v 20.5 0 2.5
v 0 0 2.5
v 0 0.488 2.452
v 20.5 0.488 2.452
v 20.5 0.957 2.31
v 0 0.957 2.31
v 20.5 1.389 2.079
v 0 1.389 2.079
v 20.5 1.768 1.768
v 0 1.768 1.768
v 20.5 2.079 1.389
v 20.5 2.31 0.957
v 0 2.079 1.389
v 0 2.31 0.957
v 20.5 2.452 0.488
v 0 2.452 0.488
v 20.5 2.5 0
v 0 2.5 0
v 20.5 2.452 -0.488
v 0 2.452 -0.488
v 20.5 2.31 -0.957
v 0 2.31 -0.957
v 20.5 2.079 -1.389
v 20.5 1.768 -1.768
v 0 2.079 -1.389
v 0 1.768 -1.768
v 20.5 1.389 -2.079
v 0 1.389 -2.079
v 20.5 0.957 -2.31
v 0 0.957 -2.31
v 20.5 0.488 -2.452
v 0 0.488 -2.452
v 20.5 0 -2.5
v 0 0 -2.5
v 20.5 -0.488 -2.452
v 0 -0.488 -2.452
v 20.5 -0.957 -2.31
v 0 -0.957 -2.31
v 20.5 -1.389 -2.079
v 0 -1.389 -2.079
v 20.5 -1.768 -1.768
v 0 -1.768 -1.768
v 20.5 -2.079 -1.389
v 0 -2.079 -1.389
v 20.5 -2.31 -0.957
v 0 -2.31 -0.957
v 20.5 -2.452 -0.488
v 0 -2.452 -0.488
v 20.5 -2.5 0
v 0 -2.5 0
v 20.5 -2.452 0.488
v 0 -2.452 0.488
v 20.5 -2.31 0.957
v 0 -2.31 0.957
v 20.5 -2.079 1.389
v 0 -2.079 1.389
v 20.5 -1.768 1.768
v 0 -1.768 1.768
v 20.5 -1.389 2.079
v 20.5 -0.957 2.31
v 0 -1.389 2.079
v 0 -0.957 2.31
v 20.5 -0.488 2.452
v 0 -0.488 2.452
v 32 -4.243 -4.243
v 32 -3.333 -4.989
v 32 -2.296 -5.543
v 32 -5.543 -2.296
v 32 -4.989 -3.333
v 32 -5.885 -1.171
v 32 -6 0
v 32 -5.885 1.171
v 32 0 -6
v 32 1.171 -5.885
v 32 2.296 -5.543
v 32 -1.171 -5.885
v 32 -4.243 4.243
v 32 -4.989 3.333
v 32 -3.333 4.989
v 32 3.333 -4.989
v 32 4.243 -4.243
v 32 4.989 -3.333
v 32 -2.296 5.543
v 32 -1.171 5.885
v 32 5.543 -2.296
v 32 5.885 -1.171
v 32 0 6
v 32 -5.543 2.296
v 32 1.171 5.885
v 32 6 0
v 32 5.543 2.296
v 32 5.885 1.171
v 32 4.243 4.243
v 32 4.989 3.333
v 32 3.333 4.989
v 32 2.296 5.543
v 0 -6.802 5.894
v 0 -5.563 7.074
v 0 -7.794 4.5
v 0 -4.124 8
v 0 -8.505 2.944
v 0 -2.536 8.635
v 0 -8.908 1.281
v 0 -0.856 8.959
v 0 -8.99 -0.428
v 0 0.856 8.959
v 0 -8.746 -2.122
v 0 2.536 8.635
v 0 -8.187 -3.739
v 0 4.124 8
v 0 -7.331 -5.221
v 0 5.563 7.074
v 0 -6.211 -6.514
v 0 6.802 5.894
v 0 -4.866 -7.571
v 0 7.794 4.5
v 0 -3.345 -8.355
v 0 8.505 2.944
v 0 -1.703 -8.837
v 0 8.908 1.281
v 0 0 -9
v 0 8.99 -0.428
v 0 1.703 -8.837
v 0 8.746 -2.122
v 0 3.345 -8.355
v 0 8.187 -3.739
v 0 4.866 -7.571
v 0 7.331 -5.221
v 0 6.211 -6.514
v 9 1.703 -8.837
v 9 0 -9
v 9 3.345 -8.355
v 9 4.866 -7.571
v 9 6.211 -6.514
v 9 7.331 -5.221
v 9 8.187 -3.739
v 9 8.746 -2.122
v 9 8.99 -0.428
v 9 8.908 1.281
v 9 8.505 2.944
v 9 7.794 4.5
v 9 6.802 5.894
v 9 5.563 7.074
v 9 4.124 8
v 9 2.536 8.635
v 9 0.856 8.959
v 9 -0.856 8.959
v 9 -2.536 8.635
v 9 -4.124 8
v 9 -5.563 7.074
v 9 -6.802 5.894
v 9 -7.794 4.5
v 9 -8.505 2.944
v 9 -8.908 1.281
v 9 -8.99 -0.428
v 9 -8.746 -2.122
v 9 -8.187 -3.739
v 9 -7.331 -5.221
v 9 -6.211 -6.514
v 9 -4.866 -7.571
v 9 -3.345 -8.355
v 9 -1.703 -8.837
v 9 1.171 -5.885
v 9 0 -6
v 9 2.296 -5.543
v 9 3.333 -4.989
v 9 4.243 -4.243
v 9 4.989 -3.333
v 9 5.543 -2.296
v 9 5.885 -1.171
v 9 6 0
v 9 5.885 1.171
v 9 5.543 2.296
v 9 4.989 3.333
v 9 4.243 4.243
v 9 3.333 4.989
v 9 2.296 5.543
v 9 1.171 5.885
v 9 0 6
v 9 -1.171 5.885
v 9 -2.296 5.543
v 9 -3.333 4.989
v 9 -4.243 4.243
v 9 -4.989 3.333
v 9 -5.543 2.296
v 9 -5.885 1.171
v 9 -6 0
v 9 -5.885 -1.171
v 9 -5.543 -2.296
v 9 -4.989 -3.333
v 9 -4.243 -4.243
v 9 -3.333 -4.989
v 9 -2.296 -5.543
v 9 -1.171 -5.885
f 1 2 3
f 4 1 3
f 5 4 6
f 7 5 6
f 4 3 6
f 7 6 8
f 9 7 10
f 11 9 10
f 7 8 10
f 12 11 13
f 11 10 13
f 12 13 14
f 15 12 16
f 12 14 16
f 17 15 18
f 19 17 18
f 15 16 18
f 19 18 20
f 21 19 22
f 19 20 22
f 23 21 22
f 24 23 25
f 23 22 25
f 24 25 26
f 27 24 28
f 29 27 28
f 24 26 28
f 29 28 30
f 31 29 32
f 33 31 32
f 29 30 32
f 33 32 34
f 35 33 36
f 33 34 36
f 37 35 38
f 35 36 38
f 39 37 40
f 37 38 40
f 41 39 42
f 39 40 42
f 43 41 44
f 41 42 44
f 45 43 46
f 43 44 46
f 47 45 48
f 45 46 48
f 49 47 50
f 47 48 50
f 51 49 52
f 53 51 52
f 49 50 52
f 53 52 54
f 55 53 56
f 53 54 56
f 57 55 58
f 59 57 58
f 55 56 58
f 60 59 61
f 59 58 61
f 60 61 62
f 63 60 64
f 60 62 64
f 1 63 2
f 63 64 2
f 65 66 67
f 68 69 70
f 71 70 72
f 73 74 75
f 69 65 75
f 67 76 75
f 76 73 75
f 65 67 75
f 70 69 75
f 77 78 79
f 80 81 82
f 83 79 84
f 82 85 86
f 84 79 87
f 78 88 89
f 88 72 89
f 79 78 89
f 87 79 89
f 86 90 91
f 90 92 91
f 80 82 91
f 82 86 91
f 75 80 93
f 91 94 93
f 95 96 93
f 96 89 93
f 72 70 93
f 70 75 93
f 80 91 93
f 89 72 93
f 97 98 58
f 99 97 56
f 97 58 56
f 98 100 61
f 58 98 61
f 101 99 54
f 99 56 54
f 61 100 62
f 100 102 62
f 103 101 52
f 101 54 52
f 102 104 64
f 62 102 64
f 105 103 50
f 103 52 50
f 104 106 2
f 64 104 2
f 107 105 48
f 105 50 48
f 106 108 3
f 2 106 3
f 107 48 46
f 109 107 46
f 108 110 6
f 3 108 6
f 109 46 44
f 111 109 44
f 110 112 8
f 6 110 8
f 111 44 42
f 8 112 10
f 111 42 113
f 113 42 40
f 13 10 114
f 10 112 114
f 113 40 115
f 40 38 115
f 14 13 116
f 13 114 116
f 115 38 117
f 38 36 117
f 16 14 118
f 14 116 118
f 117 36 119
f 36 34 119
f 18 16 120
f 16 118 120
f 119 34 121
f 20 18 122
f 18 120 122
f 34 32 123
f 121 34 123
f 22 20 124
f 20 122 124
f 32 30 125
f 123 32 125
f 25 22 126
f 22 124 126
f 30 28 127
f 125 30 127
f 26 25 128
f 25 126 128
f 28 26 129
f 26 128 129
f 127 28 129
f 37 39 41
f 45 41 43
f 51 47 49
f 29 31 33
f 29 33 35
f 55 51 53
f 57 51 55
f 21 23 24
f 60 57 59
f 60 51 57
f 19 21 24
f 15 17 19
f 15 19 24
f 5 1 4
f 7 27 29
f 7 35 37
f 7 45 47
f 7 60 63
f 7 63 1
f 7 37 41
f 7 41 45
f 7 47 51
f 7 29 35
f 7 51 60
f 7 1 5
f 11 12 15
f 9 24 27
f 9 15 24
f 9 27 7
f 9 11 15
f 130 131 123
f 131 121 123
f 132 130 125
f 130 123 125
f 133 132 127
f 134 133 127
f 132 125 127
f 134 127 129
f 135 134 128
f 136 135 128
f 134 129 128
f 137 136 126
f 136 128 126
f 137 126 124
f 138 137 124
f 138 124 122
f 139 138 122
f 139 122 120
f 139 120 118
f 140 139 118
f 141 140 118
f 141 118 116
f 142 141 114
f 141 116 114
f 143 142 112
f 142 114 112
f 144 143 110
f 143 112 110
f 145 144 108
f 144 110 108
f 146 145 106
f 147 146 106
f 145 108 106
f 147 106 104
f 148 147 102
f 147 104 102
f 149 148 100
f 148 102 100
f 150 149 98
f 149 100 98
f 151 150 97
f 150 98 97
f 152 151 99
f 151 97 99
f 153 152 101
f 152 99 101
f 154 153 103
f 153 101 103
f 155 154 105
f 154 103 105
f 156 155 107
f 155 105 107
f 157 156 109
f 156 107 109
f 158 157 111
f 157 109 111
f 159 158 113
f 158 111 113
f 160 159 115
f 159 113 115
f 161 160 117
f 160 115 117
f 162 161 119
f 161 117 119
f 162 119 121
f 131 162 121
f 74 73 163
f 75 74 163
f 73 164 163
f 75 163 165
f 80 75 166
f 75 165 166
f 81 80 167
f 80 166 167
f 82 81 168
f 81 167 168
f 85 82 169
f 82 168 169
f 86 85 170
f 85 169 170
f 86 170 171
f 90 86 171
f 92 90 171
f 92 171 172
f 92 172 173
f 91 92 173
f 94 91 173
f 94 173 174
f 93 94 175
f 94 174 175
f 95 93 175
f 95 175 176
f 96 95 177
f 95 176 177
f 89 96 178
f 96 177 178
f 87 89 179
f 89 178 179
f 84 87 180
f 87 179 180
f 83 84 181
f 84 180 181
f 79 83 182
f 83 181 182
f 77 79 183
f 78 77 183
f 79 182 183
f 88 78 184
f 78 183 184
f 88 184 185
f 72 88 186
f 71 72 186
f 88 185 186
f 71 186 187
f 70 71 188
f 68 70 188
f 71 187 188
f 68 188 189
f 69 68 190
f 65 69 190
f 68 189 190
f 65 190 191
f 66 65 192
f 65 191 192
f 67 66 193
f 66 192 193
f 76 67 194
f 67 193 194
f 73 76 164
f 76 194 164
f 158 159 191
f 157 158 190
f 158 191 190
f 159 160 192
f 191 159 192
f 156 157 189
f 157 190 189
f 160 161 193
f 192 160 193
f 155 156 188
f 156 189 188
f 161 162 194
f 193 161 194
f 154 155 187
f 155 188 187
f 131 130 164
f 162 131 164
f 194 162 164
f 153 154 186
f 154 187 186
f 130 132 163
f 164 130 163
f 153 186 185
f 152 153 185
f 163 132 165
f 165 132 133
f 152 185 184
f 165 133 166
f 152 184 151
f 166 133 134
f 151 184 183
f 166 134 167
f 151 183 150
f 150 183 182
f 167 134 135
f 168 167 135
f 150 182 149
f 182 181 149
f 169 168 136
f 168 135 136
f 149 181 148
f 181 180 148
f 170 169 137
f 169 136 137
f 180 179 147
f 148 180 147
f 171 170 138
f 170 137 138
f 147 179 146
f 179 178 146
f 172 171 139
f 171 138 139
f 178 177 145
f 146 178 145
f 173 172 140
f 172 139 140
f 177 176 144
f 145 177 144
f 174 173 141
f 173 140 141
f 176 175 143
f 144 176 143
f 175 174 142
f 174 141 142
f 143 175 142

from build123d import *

# Parameters (mm, degrees)
SKIZZE4_R                       = 2.5
SCHNITT_LINEAR_AUSTRAGEN1_DEPTH = 20.5


with BuildPart() as part:
    # Skizze3 → Rotation1 (revolve)
    with BuildSketch(Plane(origin=(0, 0, 0), x_dir=(1, 0, 0), z_dir=(0, 1, 0))):
        Polygon((0, 0), (32, 0), (32, 6), (9, 6), (9, 9), (0, 9), align=None)
    revolve(axis=Axis((0, 0, 0), (1, 0, 0)))

    # Skizze4 → Schnitt-Linear austragen1 (cut)
    with BuildSketch(Plane.ZY):
        Circle(SKIZZE4_R)
    extrude(amount=-SCHNITT_LINEAR_AUSTRAGEN1_DEPTH, mode=Mode.SUBTRACT)


solid = part.part
